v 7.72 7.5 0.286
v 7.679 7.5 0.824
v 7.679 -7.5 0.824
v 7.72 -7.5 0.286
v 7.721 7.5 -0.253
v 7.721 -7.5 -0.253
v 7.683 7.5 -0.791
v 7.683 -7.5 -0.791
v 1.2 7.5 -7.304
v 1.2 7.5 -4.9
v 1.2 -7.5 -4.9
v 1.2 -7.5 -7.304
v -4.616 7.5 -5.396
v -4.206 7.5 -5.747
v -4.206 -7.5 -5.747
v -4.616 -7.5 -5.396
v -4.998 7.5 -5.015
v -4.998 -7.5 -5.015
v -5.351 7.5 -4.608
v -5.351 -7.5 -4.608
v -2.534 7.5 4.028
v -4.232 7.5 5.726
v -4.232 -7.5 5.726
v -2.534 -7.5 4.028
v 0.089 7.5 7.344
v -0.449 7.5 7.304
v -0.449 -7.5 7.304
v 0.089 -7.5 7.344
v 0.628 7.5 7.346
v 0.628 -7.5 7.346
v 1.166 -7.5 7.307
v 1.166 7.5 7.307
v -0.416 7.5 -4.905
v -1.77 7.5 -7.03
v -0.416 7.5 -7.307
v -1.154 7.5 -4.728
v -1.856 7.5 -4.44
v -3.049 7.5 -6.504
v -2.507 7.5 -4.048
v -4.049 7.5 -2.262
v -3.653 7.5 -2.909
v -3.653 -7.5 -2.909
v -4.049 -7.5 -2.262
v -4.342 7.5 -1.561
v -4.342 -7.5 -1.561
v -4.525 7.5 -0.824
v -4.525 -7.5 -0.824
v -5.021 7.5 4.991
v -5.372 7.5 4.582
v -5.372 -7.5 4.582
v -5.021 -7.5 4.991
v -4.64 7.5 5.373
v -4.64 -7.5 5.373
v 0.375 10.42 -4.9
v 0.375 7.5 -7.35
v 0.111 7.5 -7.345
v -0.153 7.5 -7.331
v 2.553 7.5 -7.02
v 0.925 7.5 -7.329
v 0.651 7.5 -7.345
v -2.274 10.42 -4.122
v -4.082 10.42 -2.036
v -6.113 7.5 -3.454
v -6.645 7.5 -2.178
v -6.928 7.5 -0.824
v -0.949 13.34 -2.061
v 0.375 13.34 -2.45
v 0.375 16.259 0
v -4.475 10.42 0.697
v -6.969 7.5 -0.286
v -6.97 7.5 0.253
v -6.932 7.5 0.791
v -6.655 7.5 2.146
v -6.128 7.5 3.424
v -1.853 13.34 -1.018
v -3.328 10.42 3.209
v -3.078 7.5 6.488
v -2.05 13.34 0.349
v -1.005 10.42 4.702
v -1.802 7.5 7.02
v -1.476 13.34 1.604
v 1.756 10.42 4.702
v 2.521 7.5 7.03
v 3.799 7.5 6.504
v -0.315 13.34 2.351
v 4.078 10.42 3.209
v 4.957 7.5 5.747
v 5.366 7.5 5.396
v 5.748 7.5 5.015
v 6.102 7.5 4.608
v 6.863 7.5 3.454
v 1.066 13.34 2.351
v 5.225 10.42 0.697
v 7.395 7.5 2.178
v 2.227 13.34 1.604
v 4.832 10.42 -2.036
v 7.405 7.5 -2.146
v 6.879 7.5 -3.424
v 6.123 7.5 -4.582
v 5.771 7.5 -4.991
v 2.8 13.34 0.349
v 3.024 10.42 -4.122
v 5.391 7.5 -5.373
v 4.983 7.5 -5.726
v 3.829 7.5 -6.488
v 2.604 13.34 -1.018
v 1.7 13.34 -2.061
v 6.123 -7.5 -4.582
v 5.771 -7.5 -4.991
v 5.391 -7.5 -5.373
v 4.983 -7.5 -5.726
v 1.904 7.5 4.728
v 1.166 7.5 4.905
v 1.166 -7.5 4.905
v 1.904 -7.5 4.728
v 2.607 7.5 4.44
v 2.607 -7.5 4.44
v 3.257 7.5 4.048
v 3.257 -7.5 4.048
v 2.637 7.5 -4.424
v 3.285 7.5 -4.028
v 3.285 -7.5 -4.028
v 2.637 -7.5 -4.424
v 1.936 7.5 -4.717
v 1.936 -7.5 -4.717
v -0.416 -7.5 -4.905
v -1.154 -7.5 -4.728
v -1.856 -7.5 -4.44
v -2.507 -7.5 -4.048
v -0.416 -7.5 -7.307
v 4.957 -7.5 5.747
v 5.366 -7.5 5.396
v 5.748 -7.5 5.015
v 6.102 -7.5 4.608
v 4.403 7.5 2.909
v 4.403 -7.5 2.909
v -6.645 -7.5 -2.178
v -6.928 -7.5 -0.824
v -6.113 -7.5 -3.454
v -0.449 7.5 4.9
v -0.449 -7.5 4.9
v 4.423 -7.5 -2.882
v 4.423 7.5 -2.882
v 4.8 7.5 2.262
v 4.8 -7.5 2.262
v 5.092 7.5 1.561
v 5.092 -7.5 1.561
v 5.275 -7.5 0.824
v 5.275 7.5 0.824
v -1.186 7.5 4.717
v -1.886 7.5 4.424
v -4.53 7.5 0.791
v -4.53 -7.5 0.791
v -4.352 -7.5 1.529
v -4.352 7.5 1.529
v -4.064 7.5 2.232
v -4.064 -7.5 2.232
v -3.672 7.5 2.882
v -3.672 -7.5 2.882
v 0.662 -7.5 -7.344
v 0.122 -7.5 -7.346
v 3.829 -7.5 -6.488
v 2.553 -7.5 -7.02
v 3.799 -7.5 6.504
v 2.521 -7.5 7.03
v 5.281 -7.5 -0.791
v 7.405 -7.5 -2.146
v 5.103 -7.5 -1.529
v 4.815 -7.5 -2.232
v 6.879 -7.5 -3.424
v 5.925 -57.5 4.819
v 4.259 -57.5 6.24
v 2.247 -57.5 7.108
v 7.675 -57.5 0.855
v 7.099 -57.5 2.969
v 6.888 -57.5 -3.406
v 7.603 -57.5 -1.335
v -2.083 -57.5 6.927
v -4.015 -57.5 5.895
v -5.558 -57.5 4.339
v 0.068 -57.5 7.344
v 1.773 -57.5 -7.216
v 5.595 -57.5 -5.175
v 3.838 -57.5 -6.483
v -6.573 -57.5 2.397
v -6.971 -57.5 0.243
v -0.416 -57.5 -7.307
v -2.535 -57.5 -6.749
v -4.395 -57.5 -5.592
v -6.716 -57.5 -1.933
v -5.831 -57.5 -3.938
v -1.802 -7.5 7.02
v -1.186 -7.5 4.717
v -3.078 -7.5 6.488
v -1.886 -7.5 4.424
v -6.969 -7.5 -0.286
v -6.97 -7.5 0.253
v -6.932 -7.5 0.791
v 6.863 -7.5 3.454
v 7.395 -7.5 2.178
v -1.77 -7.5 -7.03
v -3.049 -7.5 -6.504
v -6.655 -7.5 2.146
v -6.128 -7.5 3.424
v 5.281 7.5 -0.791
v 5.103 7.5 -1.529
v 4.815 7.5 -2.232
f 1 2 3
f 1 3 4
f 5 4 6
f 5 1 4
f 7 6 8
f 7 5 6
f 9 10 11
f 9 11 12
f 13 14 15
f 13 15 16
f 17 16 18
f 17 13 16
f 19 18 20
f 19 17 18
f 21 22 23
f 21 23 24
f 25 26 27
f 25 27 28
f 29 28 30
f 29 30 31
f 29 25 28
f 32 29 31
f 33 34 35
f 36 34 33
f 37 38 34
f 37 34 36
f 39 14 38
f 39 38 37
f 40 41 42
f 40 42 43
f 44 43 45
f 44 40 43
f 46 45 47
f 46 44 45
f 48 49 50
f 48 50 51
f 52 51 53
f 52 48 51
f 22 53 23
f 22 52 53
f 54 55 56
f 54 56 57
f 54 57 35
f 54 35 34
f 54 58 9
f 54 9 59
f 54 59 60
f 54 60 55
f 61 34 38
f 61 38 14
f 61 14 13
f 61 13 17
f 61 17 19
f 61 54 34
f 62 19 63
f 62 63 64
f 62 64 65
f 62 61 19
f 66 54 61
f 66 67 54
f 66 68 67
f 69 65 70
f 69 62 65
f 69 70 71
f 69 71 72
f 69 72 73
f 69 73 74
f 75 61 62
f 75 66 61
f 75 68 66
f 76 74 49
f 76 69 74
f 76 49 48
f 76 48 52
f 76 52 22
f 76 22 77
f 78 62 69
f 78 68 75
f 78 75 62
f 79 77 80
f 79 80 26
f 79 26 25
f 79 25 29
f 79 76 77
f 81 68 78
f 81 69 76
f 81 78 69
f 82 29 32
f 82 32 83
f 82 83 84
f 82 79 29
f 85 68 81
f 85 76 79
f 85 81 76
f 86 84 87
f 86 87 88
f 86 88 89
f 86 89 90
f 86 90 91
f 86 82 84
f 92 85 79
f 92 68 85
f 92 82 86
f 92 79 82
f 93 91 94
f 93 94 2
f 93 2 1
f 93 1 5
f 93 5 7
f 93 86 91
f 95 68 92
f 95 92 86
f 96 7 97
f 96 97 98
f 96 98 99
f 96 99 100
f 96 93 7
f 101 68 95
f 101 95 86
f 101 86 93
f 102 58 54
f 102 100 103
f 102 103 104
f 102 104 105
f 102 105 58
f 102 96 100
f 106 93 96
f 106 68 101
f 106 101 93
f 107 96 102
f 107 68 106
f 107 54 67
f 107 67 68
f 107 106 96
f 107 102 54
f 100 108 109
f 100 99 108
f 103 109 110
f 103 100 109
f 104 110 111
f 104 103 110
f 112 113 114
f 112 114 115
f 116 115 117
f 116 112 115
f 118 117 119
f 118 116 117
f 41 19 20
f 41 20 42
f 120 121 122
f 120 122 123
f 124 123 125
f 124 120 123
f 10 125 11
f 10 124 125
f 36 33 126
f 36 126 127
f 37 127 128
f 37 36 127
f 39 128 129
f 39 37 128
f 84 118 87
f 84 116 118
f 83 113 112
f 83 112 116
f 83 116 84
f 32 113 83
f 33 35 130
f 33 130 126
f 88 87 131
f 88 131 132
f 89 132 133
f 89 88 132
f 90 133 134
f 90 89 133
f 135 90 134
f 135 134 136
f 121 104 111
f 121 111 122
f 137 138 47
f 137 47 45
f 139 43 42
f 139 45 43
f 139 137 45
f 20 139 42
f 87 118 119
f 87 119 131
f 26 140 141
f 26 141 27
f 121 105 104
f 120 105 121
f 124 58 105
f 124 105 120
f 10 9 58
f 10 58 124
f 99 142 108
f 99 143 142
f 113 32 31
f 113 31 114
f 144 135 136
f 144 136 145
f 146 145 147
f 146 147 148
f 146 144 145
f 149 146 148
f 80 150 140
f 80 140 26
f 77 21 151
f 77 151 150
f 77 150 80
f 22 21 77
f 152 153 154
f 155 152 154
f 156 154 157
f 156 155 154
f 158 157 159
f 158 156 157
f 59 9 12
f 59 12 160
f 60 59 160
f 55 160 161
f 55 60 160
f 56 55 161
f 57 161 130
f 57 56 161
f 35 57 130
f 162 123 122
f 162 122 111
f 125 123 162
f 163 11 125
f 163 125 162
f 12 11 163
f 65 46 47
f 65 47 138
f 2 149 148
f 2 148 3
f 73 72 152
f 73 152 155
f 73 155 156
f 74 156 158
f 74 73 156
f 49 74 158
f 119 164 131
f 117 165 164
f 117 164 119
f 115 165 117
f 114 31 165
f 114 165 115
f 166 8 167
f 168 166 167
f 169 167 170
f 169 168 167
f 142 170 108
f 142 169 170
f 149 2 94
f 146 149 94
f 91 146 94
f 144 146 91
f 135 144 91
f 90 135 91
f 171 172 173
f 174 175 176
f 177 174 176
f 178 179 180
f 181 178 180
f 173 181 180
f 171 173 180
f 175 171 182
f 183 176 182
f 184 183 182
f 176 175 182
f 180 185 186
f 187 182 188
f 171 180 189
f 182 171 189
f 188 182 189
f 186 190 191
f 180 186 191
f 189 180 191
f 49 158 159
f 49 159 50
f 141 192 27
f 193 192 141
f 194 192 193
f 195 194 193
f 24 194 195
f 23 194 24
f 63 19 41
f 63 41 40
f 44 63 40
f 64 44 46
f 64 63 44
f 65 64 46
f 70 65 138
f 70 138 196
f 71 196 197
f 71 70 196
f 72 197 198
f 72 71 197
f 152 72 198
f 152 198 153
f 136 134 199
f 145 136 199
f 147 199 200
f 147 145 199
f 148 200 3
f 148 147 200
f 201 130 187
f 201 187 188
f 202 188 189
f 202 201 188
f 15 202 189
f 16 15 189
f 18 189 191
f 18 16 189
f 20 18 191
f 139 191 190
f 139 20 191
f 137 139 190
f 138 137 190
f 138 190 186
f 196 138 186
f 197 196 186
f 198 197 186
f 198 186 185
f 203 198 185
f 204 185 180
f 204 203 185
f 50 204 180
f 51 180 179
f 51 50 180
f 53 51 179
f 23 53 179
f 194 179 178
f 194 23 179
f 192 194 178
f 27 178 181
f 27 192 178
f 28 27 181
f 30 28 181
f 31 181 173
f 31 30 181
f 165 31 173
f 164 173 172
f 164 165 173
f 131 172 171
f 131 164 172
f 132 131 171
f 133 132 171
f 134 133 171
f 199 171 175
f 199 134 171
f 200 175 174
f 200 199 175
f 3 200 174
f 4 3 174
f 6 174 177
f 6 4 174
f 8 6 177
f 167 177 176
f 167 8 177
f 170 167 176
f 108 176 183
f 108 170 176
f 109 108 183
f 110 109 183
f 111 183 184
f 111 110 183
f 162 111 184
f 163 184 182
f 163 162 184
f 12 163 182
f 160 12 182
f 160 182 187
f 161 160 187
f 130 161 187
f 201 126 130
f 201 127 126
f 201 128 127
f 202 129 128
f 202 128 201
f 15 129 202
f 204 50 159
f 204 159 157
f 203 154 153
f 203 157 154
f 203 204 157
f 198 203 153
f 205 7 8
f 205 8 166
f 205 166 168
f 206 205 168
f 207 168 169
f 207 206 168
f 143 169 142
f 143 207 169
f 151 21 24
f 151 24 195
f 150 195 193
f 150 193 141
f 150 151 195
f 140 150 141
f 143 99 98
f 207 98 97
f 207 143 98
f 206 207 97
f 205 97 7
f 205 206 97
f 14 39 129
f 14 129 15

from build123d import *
from build123d.topology import SkipClean

# Parameters (mm, degrees)
BOSS_EXTRUDE1_DEPTH = 7.5
BOSS_EXTRUDE3_START = -7.5
SKETCH1_7_R         = 7.35
BOSS_EXTRUDE3_DEPTH = 50


with BuildPart() as part:
    # Sketch1 → Boss-Extrude1 (new, symmetric)
    with BuildSketch(Plane(origin=(0, 0, 0), x_dir=(1, 0, 0), z_dir=(0, 1, 0))):
        with BuildLine():
            ThreePointArc((6.122564101, 4.581600452), (5.584294246, 5.185414455), (4.982932131, 5.726422213))
            Line((4.982932131, 5.726422213), (3.28457771, 4.028067792))
            ThreePointArc((3.28457771, 4.028067792), (2.292289605, 4.584151566), (1.199538666, 4.9))
            Line((1.199538666, 4.9), (1.199538666, 7.303634322))
            ThreePointArc((1.199538666, 7.303634322), (0.391963425, 7.349981033), (-0.415814059, 7.307304058))
            Line((-0.415814059, 7.307304058), (-0.415814059, 4.905468202))
            ThreePointArc((-0.415814059, 4.905468202), (-1.510678314, 4.597025162), (-2.506708483, 4.047672132))
            Line((-2.506708483, 4.047672132), (-4.206334611, 5.747298261))
            ThreePointArc((-4.206334611, 5.747298261), (-4.810148615, 5.209028406), (-5.351156372, 4.60766629))
            Line((-5.351156372, 4.60766629), (-3.652801952, 2.909311869))
            ThreePointArc((-3.652801952, 2.909311869), (-4.208885725, 1.917023764), (-4.524734159, 0.824272826))
            Line((-4.524734159, 0.824272826), (-6.928368481, 0.824272826))
            ThreePointArc((-6.928368481, 0.824272826), (-6.974715193, 0.016697585), (-6.932038217, -0.791079899))
            Line((-6.932038217, -0.791079899), (-4.530202362, -0.791079899))
            ThreePointArc((-4.530202362, -0.791079899), (-4.221759321, -1.885944155), (-3.672406292, -2.881974323))
            Line((-3.672406292, -2.881974323), (-5.37203242, -4.581600452))
            ThreePointArc((-5.37203242, -4.581600452), (-4.833762565, -5.185414455), (-4.23240045, -5.726422213))
            Line((-4.23240045, -5.726422213), (-2.534046029, -4.028067792))
            ThreePointArc((-2.534046029, -4.028067792), (-1.541757924, -4.584151566), (-0.449006985, -4.9))
            Line((-0.449006985, -4.9), (-0.449006985, -7.303634322))
            ThreePointArc((-0.449006985, -7.303634322), (0.358568256, -7.349981033), (1.16634574, -7.307304058))
            Line((1.16634574, -7.307304058), (1.16634574, -4.905468202))
            ThreePointArc((1.16634574, -4.905468202), (2.261209995, -4.597025162), (3.257240164, -4.047672132))
            Line((3.257240164, -4.047672132), (4.956866292, -5.747298261))
            ThreePointArc((4.956866292, -5.747298261), (5.560680296, -5.209028406), (6.101688053, -4.60766629))
            Line((6.101688053, -4.60766629), (4.403333633, -2.909311869))
            ThreePointArc((4.403333633, -2.909311869), (4.959417406, -1.917023764), (5.275265841, -0.824272826))
            Line((5.275265841, -0.824272826), (7.678900162, -0.824272826))
            ThreePointArc((7.678900162, -0.824272826), (7.725246874, -0.016697585), (7.682569898, 0.791079899))
            Line((7.682569898, 0.791079899), (5.280734043, 0.791079899))
            ThreePointArc((5.280734043, 0.791079899), (4.972291002, 1.885944155), (4.422937973, 2.881974323))
            Line((4.422937973, 2.881974323), (6.122564101, 4.581600452))
        make_face()
    extrude(amount=BOSS_EXTRUDE1_DEPTH, both=True)

    # Boss-Extrude2 cone 1 section (through the dimple's axis) → Boss-Extrude2 (revolve)
    with BuildSketch(Plane(origin=(0.375265841, 7.5, 0), x_dir=(0, 0, -1), z_dir=(1, 0, 0))):
        Polygon((0, 0), (7.35, 0), (0, 8.759388906), align=None)
    revolve(axis=Axis((0.375265841, 7.5, 0), (0, 1, 0)))

    # Sketch1<7> → Boss-Extrude3 (add)
    with SkipClean():  # the faces are left unmerged after this step: merging them gives an invalid solid
        with BuildSketch(Plane(origin=(0, 0, 0), x_dir=(1, 0, 0), z_dir=(0, 1, 0)).offset(BOSS_EXTRUDE3_START)):
            with Locations(Location((0.375265841, 0, 0), (0, 0, 96.178708688))):
                Circle(SKETCH1_7_R)
        extrude(amount=-BOSS_EXTRUDE3_DEPTH)


solid = part.part
